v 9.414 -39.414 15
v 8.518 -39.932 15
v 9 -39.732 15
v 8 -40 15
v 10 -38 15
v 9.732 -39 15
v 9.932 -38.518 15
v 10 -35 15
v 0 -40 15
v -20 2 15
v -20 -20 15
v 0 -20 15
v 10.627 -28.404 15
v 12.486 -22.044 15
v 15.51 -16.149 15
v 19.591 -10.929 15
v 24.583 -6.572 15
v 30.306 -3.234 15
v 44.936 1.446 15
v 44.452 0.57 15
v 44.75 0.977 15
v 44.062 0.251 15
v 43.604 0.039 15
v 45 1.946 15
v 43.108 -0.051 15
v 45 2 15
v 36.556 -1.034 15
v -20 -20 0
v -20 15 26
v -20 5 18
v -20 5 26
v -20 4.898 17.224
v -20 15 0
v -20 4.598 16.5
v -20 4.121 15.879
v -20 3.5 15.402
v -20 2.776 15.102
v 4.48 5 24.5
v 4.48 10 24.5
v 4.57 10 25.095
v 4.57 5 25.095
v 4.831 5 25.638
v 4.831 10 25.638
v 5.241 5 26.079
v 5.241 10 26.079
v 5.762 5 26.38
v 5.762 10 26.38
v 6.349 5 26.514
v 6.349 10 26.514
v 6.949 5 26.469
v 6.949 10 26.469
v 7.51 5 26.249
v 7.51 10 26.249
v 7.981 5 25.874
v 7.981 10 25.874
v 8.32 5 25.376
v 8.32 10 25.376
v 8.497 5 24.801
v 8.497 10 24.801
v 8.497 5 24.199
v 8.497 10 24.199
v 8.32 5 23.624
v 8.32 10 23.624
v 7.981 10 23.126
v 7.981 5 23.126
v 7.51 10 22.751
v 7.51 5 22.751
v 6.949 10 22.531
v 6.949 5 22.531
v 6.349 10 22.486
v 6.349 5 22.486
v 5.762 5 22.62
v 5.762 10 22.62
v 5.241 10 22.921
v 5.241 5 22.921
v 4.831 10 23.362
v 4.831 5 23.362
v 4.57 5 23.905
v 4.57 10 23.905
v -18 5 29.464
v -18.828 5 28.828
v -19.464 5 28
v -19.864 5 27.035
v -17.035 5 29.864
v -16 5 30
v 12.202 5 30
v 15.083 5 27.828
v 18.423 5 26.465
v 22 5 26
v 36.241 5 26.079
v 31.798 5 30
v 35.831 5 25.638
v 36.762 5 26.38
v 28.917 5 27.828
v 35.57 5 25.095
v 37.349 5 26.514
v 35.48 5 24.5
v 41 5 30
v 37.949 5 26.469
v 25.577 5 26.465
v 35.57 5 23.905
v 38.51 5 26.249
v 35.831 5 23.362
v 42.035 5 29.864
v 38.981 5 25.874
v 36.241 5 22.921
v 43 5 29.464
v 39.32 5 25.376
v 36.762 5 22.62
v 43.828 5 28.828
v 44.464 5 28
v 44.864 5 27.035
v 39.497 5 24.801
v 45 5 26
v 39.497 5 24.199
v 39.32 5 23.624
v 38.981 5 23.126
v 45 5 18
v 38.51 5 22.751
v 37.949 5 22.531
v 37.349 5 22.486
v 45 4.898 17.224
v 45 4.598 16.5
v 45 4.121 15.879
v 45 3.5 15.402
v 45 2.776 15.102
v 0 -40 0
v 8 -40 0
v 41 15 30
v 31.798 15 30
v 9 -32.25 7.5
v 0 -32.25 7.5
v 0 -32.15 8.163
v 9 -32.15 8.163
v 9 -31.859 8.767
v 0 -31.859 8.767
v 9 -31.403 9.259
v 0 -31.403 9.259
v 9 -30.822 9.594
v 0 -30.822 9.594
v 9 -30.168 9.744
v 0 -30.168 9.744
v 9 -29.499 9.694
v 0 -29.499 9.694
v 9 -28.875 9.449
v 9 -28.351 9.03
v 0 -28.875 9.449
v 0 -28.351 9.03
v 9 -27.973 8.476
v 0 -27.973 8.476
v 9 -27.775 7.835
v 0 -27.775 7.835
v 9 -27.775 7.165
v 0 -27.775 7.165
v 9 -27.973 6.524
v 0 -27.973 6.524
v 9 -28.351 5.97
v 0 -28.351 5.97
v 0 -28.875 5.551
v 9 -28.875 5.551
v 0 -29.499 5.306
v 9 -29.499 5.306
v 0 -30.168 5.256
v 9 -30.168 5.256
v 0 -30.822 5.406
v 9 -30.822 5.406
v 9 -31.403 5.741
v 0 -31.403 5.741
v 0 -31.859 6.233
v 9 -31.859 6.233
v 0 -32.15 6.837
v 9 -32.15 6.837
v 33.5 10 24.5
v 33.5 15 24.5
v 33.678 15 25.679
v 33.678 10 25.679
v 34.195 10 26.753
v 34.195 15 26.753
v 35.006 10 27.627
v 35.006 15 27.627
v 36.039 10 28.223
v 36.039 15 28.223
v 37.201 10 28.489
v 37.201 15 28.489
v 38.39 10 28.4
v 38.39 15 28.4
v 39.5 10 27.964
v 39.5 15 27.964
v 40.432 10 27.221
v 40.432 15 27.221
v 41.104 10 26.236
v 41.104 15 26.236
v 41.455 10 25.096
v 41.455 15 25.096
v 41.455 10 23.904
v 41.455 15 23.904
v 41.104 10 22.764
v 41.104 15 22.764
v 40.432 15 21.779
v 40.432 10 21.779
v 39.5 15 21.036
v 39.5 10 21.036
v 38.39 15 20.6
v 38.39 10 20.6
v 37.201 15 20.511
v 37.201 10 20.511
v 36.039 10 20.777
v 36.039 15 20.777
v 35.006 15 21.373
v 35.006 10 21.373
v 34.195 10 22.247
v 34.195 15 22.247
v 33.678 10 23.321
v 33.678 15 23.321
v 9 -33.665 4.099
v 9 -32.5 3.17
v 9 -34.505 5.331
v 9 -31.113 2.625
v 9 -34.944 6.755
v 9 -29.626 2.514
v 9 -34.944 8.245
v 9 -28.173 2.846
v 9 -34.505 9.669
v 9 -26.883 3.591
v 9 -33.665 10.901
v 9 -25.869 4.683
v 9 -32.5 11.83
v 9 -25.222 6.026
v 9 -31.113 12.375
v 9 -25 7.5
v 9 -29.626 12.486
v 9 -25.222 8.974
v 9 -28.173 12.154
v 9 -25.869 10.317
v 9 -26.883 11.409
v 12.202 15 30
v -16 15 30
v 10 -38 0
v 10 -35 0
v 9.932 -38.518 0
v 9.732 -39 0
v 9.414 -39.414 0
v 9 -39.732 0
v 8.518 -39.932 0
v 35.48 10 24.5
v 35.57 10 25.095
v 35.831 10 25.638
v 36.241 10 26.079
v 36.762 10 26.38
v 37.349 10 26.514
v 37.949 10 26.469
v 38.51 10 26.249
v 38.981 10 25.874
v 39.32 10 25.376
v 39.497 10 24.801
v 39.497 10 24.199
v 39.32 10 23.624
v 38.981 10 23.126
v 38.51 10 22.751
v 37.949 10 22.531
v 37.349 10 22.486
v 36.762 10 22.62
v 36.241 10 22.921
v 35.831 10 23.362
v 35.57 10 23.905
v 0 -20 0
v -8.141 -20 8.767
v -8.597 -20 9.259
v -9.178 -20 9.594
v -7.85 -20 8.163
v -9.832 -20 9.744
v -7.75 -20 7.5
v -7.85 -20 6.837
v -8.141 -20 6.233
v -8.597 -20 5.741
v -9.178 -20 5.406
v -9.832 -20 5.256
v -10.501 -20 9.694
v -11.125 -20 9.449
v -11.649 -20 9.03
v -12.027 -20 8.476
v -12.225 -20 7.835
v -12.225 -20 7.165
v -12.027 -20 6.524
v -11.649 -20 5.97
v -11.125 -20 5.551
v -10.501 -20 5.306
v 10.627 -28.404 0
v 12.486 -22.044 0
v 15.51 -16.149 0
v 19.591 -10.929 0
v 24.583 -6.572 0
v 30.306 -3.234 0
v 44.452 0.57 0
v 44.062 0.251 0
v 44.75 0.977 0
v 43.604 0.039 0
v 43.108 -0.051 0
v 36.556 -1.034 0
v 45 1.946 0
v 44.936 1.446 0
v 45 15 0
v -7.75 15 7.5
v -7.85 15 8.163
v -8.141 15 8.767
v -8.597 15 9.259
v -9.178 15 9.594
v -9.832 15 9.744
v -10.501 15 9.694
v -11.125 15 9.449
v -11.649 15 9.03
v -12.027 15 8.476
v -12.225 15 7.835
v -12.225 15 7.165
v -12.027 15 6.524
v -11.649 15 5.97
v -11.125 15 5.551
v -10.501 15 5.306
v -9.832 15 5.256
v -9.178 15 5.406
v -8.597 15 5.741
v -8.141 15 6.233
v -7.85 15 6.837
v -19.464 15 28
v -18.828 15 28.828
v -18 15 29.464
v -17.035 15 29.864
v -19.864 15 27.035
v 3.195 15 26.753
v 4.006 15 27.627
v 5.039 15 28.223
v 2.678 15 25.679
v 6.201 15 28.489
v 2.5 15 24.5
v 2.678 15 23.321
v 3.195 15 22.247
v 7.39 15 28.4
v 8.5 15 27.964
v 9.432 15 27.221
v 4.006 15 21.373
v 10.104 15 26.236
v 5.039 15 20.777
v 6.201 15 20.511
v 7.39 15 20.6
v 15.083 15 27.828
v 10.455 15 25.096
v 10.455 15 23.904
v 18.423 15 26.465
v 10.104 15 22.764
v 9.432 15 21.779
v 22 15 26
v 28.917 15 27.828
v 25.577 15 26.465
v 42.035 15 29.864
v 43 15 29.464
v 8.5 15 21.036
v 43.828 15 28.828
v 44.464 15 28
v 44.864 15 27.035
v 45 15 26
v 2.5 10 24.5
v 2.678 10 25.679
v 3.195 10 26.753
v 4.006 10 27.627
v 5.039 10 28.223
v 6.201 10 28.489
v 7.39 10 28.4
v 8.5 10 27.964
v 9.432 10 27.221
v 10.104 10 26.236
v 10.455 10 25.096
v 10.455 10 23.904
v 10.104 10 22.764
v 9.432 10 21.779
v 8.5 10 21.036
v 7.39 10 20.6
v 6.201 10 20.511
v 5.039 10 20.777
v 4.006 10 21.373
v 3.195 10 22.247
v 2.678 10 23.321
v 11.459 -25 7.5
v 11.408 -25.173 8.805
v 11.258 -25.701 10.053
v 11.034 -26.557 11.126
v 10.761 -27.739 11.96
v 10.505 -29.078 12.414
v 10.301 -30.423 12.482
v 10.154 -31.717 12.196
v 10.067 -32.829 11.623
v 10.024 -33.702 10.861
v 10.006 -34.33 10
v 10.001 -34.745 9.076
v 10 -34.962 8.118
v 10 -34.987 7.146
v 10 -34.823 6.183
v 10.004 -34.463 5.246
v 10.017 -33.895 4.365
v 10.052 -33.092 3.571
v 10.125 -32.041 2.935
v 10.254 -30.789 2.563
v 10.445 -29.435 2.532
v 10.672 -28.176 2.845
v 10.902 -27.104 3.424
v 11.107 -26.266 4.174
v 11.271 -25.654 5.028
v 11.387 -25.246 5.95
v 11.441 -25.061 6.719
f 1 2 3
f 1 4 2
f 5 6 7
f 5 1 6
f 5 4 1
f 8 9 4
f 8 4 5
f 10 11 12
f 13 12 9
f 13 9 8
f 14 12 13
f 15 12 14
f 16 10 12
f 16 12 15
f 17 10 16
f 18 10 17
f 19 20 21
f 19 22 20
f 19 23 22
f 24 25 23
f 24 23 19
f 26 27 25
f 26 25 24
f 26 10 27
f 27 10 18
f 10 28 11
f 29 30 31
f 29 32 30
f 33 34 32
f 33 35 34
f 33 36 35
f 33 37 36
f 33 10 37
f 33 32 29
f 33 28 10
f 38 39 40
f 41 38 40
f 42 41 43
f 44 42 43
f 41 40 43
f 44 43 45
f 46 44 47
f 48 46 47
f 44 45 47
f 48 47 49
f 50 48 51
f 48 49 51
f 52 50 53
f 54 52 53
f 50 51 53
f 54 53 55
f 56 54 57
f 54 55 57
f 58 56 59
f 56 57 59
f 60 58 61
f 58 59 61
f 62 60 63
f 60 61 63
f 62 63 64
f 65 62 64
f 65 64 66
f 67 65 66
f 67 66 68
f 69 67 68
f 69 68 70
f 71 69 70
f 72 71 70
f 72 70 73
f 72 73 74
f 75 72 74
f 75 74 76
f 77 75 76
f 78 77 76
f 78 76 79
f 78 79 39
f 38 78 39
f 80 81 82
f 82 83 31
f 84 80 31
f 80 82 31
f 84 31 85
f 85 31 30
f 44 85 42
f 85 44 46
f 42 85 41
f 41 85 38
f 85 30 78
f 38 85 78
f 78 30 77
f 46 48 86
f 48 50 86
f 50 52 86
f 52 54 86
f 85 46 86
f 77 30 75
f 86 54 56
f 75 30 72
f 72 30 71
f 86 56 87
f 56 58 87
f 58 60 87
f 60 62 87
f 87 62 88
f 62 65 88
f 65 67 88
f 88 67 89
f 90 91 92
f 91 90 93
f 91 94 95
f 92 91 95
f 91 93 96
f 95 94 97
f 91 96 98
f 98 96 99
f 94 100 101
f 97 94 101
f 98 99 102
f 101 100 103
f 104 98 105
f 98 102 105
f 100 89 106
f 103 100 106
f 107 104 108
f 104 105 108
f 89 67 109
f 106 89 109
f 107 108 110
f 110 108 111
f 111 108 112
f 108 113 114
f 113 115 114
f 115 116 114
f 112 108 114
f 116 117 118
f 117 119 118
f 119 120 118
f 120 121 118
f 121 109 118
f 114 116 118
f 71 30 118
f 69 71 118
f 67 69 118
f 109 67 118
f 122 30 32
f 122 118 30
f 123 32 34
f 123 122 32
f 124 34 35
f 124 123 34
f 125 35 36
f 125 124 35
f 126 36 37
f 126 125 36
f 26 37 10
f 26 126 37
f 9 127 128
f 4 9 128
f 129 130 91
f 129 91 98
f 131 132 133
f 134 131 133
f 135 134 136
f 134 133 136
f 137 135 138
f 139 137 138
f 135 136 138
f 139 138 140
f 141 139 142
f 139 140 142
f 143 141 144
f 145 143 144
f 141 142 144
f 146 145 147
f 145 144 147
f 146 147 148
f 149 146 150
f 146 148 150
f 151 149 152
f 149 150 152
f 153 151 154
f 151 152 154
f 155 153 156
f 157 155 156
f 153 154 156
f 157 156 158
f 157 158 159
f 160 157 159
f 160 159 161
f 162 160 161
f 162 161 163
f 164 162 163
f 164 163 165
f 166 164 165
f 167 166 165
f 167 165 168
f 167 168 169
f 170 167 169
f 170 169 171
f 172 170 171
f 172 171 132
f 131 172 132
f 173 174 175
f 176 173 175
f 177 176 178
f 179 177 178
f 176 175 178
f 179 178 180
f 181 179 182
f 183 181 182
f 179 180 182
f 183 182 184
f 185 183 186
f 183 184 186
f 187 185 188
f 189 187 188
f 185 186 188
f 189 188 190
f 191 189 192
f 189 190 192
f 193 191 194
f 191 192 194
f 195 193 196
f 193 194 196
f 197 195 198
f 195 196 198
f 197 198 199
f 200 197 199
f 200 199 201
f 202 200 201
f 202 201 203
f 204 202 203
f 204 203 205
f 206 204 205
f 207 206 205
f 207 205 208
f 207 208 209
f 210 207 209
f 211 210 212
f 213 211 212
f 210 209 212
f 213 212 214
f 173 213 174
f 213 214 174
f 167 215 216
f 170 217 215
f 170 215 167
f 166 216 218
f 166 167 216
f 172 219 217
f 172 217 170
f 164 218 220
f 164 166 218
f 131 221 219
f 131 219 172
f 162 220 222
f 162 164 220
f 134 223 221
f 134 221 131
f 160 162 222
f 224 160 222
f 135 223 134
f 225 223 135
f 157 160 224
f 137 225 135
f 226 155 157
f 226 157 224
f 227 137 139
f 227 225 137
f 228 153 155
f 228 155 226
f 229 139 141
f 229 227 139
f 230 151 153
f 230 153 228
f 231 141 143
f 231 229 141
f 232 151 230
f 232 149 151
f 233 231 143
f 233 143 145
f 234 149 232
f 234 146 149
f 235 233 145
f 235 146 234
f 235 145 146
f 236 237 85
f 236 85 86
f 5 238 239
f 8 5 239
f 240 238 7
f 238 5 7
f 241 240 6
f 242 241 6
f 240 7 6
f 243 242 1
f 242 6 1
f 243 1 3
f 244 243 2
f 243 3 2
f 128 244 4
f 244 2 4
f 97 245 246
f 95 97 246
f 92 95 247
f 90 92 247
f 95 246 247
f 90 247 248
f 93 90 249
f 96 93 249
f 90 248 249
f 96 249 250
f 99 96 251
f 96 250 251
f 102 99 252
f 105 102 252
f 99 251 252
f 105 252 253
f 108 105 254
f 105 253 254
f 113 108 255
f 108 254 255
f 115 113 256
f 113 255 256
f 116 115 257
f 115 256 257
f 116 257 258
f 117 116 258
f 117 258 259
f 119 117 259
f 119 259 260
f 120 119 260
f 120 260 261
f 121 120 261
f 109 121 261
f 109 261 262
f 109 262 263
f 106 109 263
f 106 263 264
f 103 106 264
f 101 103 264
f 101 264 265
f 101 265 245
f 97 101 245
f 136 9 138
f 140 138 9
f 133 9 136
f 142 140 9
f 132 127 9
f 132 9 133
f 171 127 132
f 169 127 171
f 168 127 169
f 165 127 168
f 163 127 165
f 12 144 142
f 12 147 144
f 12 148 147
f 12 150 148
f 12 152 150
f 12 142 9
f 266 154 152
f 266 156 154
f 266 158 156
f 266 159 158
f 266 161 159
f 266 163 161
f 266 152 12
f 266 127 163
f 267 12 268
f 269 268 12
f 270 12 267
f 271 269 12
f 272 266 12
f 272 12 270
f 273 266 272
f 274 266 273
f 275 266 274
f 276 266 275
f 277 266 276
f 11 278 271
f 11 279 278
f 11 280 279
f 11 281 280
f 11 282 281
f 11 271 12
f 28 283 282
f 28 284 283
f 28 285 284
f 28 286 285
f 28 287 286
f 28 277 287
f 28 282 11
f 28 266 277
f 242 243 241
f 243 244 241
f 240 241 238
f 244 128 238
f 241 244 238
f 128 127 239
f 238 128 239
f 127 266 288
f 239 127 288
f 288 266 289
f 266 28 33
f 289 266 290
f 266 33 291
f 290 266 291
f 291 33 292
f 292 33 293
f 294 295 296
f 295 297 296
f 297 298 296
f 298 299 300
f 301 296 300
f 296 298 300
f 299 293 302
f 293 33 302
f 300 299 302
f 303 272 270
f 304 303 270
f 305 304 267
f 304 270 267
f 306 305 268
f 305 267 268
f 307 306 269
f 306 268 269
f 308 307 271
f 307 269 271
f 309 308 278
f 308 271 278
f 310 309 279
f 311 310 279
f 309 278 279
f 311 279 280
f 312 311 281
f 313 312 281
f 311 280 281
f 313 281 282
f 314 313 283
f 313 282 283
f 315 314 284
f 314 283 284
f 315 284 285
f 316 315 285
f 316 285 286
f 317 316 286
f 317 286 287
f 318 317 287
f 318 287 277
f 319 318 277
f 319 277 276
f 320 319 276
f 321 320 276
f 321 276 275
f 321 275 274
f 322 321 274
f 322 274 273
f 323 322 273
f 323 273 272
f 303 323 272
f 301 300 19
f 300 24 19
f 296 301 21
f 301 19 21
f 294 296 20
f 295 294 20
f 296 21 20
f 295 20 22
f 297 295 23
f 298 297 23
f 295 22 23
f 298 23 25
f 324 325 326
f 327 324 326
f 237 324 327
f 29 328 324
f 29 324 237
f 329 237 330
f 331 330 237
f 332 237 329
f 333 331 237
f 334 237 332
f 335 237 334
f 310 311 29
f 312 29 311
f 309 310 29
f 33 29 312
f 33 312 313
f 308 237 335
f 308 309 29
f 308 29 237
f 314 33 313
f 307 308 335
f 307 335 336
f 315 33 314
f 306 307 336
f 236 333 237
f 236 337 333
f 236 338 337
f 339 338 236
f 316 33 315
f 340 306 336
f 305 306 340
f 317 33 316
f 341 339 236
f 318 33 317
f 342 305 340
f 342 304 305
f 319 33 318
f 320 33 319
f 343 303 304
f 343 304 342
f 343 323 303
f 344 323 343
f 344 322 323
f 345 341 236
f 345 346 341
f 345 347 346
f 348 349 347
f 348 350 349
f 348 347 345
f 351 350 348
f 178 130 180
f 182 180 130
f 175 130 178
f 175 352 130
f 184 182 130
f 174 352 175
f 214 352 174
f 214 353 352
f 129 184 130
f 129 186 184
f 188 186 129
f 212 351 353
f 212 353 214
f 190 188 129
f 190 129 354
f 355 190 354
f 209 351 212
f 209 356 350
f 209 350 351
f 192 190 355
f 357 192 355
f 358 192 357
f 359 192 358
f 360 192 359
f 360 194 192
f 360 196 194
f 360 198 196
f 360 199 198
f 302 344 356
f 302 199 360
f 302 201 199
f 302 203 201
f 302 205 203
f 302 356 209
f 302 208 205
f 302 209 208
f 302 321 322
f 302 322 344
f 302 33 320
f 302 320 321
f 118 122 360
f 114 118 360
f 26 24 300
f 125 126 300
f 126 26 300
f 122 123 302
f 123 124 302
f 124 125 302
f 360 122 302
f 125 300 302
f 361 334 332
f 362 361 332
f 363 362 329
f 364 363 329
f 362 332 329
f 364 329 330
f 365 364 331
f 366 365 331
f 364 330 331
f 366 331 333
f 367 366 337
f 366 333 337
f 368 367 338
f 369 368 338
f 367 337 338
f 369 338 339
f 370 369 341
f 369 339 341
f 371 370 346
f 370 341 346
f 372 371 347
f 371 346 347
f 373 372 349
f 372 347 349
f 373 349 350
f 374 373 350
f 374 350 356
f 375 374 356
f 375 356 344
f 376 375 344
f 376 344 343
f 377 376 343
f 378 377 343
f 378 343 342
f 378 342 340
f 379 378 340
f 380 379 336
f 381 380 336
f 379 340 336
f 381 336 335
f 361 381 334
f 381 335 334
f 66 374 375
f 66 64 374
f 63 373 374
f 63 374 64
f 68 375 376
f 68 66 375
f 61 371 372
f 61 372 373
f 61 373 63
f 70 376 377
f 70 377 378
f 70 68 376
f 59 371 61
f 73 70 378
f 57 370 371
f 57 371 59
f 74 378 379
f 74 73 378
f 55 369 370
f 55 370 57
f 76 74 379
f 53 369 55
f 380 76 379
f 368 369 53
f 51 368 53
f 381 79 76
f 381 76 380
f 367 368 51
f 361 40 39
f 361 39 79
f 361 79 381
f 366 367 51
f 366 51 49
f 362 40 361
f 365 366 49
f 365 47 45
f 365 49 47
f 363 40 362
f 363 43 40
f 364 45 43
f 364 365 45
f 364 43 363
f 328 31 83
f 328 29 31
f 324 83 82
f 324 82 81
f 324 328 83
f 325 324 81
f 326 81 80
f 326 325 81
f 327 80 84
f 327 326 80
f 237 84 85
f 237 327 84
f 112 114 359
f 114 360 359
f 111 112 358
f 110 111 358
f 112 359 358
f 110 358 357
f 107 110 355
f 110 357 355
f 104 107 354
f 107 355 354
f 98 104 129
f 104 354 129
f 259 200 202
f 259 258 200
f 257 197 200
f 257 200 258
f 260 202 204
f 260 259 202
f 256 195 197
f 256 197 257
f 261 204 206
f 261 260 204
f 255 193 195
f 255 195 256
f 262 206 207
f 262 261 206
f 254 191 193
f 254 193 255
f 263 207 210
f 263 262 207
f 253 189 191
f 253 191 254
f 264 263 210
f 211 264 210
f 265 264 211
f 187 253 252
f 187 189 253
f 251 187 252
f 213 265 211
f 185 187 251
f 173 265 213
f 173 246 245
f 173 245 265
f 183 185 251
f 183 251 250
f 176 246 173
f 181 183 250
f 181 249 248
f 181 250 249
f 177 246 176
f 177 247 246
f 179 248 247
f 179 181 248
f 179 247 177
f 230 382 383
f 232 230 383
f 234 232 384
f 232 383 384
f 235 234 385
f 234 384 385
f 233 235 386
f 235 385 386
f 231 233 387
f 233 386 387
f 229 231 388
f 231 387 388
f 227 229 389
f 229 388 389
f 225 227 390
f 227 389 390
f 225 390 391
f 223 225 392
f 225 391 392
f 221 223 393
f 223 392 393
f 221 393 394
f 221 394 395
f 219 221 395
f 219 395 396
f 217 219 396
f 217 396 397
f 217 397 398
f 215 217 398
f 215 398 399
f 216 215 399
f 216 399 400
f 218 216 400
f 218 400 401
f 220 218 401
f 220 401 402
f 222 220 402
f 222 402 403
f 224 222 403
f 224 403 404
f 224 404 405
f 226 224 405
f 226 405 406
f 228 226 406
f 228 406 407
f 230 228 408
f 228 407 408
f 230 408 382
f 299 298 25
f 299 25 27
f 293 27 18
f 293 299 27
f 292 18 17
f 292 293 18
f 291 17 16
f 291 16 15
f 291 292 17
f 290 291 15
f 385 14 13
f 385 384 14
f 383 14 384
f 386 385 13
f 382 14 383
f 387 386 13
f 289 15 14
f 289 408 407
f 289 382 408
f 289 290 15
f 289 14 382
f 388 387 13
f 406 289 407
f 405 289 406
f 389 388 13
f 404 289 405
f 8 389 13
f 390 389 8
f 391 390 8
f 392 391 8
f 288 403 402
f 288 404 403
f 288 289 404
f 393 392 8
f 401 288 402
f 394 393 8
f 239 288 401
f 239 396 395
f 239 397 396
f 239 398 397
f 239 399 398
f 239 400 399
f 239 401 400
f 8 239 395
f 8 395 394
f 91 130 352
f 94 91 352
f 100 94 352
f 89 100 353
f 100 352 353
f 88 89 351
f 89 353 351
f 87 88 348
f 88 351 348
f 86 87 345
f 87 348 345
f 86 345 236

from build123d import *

# Parameters (mm, degrees)
PAD_DEPTH       = 15
SKETCH001_R     = 2.25
POCKET_DEPTH    = 35.001
SKETCH002_R     = 2.25
POCKET001_DEPTH = 45.001
SKETCH003_R     = 5
POCKET002_DEPTH = 36
SKETCH004_W     = 65
SKETCH004_H     = 10
PAD001_DEPTH    = 15
SKETCH005_R     = 2.019914
SKETCH005_R_2   = 14
POCKET003_DEPTH = 55.001
SKETCH006_R     = 4
POCKET004_DEPTH = 5
FILLET_R        = 3
FILLET001_R     = 4
FILLET002_R     = 2


with BuildPart() as part:
    # Sketch → Pad (new body)
    with BuildSketch(Plane.XY):
        with BuildLine():
            Line((45, 15), (-20, 15))
            Line((-20, 15), (-20, -20))
            Line((0, -20), (-20, -20))
            Line((0, -40), (0, -20))
            Line((0, -40), (10, -40))
            Line((10, -40), (10, -35.000001))
            ThreePointArc((45, 0), (20.251262, -10.251263), (10, -35.000001))
            Line((45, 0), (45, 15))
        make_face()
    extrude(amount=PAD_DEPTH)

    # Sketch001 → Pocket (cut, through all)
    with BuildSketch(Plane.XZ.offset(20)):
        with Locations((-10, 7.5)):
            Circle(SKETCH001_R)
    extrude(amount=-POCKET_DEPTH, mode=Mode.SUBTRACT)

    # Sketch002 → Pocket001 (cut, through all)
    with BuildSketch(Plane(origin=(0, 0, 0), x_dir=(0, -1, 0), z_dir=(-1, 0, 0))):
        with Locations((30, 7.5)):
            Circle(SKETCH002_R)
    extrude(amount=-POCKET001_DEPTH, mode=Mode.SUBTRACT)

    # Sketch003 → Pocket002 (cut)
    with BuildSketch(Plane.YZ.offset(45)):
        with Locations((-30, 7.5)):
            Circle(SKETCH003_R)
    extrude(amount=-POCKET002_DEPTH, mode=Mode.SUBTRACT)

    # Sketch004 → Pad001 (new body)
    with BuildSketch(Plane.XY.offset(15)):
        with Locations((12.5, 10)):
            Rectangle(SKETCH004_W, SKETCH004_H)
    extrude(amount=PAD001_DEPTH)

    # Sketch005 → Pocket003 (cut, through all)
    with BuildSketch(Plane(origin=(0, 15, 0), x_dir=(-1, 0, 0), z_dir=(0, 1, 0))):
        with Locations((-37.5, 24.5)):
            Circle(SKETCH005_R)
        with Locations((-6.5, 24.5)):
            Circle(SKETCH005_R)
        with Locations((-22, 40)):
            Circle(SKETCH005_R_2)
    extrude(amount=-POCKET003_DEPTH, mode=Mode.SUBTRACT)

    # Sketch006 → Pocket004 (cut)
    with BuildSketch(Plane(origin=(0, 15, 0), x_dir=(-1, 0, 0), z_dir=(0, 1, 0))):
        with Locations((-37.5, 24.5)):
            Circle(SKETCH006_R)
        with Locations((-6.5, 24.5)):
            Circle(SKETCH006_R)
    extrude(amount=-POCKET004_DEPTH, mode=Mode.SUBTRACT)

    # Fillet
    fillet_edges = [part.edges().sort_by_distance(p)[0] for p in [
        (12.5, 5, 15),
    ]]
    fillet(fillet_edges, radius=FILLET_R)

    # Fillet001
    fillet001_edges = [part.edges().sort_by_distance(p)[0] for p in [
        (-20, 10, 30),
        (45, 10, 30),
    ]]
    fillet(fillet001_edges, radius=FILLET001_R)

    # Fillet002
    fillet002_edges = [part.edges().sort_by_distance(p)[0] for p in [
        (45, 0, 7.5),
        (10, -40, 7.5),
    ]]
    fillet(fillet002_edges, radius=FILLET002_R)


solid = part.part
